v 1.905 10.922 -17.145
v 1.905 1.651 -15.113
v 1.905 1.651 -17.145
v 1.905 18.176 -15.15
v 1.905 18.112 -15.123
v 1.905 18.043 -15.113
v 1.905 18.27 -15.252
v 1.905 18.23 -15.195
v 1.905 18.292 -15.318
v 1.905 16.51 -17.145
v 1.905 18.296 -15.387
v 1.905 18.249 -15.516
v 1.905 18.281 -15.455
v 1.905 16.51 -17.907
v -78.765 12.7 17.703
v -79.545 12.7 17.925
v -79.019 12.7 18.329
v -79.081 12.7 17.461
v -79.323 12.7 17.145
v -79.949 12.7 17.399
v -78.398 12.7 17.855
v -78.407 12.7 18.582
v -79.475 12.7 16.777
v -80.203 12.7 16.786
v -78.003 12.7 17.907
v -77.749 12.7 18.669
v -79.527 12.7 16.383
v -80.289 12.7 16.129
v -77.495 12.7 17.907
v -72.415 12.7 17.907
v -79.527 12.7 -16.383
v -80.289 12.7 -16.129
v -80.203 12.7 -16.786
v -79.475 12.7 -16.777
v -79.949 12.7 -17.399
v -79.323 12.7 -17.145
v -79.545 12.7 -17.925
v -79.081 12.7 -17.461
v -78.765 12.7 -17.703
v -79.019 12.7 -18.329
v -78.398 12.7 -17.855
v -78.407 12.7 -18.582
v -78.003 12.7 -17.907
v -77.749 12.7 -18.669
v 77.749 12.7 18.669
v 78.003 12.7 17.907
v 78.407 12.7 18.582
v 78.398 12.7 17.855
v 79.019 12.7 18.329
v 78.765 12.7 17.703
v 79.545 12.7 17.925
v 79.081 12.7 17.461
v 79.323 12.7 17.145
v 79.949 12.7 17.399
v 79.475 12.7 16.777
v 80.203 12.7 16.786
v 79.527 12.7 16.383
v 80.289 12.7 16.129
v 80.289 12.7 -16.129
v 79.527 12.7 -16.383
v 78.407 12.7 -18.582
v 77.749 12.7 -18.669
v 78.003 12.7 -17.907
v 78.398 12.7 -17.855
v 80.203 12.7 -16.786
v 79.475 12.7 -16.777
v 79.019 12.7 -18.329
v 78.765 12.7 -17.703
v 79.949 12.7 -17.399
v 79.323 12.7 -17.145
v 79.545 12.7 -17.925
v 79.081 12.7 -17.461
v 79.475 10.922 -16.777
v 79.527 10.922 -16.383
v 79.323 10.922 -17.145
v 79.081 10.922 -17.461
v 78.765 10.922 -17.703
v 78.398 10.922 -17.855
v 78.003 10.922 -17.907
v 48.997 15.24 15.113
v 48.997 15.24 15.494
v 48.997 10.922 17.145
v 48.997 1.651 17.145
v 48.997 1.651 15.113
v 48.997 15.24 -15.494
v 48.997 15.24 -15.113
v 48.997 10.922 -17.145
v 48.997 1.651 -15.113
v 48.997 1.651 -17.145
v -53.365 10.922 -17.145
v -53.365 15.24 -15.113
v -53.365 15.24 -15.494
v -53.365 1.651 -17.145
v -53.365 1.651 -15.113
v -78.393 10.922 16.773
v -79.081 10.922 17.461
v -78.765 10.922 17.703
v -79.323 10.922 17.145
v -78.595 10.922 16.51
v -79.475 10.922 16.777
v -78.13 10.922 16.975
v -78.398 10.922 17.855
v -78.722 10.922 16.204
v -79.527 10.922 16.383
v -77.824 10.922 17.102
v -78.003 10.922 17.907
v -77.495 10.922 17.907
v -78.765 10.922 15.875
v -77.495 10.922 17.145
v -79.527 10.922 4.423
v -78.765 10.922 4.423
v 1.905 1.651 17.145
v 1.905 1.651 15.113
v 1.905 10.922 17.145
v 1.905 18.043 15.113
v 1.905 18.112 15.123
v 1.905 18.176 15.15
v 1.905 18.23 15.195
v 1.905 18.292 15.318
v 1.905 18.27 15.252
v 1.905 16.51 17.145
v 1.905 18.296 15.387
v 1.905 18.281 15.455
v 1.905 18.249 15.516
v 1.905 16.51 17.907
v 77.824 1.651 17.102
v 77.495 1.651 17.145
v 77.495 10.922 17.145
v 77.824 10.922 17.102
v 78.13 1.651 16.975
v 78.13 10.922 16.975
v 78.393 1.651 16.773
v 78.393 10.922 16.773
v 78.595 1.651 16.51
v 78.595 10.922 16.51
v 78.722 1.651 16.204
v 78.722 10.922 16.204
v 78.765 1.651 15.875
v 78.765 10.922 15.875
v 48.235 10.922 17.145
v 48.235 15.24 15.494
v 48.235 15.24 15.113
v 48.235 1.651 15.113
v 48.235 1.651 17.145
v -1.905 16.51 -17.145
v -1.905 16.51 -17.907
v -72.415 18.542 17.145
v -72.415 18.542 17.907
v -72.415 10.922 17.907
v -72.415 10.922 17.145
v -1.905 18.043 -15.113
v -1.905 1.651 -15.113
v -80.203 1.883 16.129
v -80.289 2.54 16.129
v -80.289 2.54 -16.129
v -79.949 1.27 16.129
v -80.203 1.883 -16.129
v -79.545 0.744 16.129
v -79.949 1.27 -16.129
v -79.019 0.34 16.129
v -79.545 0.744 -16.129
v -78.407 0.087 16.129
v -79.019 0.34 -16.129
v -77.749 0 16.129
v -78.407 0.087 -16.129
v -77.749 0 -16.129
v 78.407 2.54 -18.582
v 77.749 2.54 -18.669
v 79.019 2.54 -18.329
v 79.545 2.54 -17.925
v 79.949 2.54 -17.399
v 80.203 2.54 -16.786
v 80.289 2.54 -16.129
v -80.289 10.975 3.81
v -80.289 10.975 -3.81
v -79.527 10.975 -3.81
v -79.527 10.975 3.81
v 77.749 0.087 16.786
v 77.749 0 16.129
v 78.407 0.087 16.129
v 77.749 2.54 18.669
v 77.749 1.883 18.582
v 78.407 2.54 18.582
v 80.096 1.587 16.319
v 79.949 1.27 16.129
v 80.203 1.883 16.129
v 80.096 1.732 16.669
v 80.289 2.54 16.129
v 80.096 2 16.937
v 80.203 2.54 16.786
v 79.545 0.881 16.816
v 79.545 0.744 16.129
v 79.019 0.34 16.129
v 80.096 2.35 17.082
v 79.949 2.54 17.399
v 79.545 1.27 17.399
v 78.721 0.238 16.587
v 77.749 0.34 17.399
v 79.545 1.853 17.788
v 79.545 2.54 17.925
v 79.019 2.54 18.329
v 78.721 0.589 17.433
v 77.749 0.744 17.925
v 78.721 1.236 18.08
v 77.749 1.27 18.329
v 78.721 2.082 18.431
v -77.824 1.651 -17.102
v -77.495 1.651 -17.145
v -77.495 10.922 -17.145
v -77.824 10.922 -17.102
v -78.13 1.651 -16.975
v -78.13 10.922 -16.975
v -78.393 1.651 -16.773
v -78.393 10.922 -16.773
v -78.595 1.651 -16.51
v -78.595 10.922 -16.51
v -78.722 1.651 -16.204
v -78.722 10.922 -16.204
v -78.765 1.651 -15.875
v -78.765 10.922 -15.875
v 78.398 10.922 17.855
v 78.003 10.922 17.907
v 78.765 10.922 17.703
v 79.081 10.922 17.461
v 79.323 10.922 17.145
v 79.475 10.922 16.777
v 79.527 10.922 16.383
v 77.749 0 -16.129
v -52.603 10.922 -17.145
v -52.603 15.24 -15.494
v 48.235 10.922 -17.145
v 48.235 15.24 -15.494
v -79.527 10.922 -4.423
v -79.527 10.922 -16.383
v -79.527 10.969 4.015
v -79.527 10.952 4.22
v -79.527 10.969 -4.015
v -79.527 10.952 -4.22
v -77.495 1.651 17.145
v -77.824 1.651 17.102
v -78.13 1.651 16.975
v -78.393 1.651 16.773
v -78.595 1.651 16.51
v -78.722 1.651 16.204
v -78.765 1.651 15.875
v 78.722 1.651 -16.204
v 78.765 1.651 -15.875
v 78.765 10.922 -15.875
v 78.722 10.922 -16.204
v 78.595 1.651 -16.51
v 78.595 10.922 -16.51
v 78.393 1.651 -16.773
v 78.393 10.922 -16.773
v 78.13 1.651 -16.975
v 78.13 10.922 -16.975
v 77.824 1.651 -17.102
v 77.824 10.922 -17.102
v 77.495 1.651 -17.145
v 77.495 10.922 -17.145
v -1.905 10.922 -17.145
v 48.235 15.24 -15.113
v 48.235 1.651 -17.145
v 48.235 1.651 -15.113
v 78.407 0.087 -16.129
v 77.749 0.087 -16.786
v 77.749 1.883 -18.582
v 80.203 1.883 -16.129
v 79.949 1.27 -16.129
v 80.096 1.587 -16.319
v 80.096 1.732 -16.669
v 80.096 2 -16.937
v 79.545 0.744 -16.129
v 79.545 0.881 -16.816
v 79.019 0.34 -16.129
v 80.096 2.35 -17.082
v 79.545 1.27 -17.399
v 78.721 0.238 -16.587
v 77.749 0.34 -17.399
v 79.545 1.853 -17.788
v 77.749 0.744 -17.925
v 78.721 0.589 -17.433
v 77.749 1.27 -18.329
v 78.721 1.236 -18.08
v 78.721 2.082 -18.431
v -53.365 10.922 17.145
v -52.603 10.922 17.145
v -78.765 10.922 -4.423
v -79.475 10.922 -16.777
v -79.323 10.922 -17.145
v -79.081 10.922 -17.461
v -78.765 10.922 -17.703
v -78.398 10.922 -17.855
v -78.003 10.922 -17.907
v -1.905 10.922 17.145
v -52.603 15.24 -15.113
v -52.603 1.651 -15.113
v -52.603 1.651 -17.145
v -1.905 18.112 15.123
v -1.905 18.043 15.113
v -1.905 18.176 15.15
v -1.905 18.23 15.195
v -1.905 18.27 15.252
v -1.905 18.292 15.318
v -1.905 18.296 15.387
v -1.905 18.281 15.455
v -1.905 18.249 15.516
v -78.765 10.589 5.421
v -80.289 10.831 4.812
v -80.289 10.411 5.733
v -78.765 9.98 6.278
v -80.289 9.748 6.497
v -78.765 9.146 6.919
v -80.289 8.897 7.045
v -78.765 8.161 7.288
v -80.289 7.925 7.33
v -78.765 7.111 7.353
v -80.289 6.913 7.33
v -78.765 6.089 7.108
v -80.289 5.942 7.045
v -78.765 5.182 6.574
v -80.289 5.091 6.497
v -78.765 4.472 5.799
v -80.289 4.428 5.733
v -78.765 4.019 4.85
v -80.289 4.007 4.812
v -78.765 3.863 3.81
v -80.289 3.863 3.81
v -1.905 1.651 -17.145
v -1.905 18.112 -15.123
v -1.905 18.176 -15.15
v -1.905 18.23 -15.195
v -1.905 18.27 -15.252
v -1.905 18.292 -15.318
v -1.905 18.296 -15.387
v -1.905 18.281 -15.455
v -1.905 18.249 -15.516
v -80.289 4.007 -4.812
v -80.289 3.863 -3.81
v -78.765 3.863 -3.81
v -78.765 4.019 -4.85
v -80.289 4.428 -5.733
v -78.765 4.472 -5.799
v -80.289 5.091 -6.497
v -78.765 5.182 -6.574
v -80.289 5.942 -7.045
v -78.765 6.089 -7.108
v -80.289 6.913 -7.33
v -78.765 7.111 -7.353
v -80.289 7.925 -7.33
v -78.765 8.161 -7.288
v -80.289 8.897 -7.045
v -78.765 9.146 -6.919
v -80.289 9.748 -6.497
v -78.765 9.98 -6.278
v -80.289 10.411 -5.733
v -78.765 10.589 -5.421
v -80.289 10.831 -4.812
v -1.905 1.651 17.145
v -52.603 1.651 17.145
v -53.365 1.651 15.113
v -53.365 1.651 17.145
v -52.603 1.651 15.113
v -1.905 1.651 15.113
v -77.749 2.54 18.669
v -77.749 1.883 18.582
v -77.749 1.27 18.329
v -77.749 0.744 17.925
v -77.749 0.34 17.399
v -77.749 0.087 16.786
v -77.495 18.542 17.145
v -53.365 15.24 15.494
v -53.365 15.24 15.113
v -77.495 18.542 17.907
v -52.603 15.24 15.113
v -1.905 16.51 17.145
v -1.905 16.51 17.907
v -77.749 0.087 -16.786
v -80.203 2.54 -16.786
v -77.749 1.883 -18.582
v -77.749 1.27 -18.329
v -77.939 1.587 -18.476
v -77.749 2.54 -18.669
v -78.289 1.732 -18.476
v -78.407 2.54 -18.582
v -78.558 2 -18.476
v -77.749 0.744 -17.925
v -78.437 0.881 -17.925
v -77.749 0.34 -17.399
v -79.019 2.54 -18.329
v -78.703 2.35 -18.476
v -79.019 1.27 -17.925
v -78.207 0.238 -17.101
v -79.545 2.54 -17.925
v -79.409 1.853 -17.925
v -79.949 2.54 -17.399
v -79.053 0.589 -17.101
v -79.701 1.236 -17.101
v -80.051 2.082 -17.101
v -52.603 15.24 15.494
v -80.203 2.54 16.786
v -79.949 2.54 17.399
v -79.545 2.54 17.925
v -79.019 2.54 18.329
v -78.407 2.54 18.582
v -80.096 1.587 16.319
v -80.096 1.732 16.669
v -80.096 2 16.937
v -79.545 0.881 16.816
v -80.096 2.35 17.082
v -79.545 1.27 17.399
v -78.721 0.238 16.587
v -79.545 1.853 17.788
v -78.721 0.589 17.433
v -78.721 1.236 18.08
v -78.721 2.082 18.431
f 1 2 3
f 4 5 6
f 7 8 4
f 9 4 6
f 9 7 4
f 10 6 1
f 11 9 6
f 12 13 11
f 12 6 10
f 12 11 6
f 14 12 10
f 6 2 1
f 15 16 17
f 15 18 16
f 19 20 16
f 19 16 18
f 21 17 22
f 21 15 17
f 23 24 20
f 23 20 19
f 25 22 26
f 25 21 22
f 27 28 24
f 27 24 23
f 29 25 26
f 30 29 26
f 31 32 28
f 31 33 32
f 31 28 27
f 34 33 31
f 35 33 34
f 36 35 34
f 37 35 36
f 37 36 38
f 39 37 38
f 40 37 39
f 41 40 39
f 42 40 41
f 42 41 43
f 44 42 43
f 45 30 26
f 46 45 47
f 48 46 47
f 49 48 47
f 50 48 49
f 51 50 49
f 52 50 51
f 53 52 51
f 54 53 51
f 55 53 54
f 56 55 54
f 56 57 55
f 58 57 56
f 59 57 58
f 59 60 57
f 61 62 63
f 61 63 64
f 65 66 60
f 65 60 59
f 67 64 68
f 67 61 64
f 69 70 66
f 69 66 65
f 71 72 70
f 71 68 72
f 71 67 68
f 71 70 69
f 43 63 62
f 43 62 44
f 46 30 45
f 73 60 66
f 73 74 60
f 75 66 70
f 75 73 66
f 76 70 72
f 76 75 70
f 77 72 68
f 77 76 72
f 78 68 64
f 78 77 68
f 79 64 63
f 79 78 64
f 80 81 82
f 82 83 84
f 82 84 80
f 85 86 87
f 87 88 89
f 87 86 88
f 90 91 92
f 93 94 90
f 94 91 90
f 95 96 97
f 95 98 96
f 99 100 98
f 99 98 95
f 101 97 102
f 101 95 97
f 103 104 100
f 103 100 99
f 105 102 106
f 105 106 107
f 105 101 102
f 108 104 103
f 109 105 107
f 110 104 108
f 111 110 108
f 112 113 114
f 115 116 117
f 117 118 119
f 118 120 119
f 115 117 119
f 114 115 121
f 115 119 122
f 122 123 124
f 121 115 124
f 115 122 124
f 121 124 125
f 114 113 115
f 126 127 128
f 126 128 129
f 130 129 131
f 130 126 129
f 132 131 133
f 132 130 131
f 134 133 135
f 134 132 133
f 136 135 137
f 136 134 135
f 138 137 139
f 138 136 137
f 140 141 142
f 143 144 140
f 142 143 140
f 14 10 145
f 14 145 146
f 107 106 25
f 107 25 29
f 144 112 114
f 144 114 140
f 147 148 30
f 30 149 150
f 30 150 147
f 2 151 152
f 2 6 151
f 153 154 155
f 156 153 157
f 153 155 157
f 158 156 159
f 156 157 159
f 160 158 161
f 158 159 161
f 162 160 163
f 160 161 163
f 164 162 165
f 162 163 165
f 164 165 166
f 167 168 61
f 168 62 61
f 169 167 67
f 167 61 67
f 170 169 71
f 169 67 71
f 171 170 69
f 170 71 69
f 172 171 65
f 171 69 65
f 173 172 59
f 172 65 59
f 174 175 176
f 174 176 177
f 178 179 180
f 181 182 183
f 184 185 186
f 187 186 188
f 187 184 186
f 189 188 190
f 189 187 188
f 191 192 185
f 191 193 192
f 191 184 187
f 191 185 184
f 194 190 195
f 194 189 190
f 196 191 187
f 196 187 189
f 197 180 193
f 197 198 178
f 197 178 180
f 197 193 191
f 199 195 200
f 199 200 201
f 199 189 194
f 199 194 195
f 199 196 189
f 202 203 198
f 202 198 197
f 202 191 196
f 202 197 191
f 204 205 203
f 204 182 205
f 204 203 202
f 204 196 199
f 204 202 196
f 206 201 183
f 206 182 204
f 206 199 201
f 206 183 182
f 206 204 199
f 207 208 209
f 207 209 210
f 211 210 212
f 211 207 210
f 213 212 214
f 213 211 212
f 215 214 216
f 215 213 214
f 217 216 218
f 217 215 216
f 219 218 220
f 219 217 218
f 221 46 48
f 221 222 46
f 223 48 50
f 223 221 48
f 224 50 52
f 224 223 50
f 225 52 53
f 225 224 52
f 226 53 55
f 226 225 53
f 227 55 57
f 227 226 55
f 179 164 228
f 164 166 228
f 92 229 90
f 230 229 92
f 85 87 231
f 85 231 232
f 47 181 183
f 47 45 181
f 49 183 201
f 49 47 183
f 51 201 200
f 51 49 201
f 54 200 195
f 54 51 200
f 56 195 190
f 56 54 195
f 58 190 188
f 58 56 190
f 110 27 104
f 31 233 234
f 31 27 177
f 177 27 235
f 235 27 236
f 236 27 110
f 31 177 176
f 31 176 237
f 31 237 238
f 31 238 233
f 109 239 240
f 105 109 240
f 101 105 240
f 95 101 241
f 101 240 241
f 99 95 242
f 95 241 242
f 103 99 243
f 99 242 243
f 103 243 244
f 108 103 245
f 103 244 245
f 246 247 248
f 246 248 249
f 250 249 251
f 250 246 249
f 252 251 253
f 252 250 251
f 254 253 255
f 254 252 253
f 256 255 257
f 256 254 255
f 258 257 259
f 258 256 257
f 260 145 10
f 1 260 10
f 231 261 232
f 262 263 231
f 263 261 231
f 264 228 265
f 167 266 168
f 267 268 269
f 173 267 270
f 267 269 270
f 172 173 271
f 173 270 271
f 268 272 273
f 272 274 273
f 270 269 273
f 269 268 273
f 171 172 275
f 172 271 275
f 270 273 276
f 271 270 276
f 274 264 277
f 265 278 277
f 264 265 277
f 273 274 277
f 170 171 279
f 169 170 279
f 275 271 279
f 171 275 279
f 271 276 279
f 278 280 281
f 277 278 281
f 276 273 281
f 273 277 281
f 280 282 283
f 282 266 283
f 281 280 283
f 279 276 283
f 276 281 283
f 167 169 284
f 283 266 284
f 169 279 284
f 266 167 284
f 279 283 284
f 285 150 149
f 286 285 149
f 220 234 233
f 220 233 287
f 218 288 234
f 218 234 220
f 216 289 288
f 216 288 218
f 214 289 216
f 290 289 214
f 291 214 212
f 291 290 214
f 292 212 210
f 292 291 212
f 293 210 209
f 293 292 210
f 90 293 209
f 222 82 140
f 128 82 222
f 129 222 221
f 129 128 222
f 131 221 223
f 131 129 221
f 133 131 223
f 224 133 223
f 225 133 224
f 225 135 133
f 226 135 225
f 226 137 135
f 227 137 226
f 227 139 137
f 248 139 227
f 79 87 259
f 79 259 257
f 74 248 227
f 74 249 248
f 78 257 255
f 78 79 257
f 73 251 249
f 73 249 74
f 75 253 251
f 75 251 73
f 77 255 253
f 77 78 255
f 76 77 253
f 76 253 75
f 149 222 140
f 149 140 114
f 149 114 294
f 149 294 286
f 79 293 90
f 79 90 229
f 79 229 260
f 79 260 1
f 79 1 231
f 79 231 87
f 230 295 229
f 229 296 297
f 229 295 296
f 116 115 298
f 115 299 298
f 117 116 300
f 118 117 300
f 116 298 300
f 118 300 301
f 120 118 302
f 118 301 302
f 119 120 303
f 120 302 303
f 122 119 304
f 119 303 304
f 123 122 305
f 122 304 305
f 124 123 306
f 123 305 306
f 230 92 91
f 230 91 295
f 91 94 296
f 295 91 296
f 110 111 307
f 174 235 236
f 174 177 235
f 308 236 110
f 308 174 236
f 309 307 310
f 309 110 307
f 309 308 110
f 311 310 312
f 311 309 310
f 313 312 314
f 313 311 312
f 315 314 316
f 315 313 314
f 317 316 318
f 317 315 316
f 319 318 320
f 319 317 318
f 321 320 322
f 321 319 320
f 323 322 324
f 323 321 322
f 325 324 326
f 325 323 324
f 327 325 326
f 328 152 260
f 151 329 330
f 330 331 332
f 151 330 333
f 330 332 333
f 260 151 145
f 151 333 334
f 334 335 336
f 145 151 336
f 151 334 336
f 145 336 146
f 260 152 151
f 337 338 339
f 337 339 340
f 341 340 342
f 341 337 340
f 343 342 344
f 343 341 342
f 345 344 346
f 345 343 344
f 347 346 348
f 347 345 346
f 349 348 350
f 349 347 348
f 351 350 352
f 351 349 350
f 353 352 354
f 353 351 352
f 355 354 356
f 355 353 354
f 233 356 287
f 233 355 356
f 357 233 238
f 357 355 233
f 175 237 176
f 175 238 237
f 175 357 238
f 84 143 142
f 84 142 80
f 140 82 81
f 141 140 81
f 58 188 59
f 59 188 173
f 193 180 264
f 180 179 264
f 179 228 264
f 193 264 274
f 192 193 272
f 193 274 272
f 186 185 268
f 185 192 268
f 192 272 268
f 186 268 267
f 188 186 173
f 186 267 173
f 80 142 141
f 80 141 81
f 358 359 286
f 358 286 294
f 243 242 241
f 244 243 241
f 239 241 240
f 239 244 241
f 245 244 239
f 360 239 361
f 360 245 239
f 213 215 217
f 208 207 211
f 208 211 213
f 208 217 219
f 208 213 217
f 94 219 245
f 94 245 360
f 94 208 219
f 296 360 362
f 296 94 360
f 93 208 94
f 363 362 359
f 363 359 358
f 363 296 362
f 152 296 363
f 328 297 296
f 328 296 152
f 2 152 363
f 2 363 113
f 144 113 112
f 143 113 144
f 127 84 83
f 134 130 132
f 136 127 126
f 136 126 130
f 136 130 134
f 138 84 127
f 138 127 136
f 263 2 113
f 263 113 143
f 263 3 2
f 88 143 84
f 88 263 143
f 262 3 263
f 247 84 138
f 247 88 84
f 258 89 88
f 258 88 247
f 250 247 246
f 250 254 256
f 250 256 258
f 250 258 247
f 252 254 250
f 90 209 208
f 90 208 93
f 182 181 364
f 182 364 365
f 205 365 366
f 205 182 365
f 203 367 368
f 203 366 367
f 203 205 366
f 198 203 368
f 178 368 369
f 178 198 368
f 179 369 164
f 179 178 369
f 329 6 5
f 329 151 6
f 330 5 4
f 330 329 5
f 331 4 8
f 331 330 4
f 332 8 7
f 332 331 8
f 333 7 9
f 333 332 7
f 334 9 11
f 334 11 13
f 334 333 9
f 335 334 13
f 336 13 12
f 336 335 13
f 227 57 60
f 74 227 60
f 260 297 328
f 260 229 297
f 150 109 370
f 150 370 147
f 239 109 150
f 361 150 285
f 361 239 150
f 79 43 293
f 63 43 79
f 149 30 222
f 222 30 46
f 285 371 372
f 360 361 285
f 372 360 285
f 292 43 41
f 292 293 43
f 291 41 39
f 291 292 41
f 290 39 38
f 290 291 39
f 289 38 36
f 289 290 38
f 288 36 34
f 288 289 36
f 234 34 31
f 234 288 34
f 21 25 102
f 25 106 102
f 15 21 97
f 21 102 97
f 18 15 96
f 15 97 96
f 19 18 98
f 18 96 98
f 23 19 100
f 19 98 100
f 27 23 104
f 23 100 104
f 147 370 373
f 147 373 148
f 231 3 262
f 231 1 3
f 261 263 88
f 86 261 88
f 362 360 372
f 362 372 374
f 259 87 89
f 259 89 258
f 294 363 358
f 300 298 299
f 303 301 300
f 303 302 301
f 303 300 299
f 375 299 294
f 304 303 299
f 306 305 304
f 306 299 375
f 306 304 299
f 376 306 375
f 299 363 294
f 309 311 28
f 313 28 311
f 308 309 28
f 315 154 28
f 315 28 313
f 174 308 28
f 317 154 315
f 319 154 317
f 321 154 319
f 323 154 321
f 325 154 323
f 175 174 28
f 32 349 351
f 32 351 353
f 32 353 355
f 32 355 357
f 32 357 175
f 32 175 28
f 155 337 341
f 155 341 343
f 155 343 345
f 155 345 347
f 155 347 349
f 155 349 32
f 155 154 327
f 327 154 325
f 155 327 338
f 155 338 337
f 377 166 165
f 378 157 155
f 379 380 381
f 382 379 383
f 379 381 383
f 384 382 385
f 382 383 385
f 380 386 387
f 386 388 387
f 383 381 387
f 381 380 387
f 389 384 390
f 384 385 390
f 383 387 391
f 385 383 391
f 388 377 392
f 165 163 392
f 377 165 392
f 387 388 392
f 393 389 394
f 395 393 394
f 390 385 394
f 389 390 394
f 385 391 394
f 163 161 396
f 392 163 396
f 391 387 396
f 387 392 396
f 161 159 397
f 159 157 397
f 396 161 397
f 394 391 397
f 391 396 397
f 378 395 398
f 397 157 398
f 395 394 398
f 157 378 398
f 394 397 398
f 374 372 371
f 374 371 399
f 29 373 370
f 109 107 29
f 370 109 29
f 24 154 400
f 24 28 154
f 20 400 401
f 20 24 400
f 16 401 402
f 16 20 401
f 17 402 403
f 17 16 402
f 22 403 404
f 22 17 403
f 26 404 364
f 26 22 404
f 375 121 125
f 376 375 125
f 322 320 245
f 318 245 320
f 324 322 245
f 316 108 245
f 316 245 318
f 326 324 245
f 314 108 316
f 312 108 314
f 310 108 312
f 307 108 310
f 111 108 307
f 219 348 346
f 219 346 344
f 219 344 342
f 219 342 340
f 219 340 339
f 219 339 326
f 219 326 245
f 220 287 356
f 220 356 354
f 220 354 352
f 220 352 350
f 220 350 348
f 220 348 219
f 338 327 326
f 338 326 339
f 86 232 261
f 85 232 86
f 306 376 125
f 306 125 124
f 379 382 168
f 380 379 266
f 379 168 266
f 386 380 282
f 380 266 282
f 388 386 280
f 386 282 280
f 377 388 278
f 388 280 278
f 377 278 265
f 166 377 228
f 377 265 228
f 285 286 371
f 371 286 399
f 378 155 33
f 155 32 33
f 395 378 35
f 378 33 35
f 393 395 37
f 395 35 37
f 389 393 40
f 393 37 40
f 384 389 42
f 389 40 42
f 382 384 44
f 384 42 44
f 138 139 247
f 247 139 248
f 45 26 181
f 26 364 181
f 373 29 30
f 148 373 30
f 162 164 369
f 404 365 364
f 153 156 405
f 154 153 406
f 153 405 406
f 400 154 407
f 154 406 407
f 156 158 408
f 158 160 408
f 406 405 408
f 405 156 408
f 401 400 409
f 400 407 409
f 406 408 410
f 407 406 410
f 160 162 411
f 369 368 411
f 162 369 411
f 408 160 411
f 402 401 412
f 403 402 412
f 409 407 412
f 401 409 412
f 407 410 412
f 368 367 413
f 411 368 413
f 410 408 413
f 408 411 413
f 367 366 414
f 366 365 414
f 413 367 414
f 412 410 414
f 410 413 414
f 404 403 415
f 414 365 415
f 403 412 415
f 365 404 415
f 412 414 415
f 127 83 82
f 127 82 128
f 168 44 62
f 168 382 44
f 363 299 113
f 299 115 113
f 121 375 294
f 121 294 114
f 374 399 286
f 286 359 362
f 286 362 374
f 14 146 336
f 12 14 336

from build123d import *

# Parameters (mm, degrees)
SKETCH1_W            = 160.5788
SKETCH1_H            = 37.338
BOSS_EXTRUDE1_DEPTH  = 12.7
SKETCH2_W            = 157.5308
SKETCH2_H            = 34.29
CUT_EXTRUDE3_DEPTH   = 11.049
FILLET1_R            = 2.54
FILLET2_R            = 1.27
CUT_EXTRUDE4_REACH   = 164.158
SKETCH4_W            = 159.0548
SKETCH4_H            = 35.814
CUT_EXTRUDE5_DEPTH   = 1.778
FILLET3_R            = 1.524
SKETCH5_W            = 5.08
SKETCH5_H            = 0.762
BOSS_EXTRUDE2_DEPTH  = 7.62
SKETCH6_W            = 0.762
SKETCH6_H            = 2.032
BOSS_EXTRUDE3_DEPTH  = 13.589
LPATTERN1_COUNT      = 2
LPATTERN1_PITCH      = 101.6
LPATTERN1_COUNT_DIR2 = 2
LPATTERN1_PITCH_DIR2 = 32.258
CUT_EXTRUDE6_REACH   = 133.936
SKETCH8_W            = 3.81
SKETCH8_H            = 2.032
BOSS_EXTRUDE4_DEPTH  = 14.859
BOSS_EXTRUDE9_DEPTH  = 3.81
FILLET4_R            = 0.254
FILLET4_OF_MIRROR2_R = 0.254


with BuildPart() as part:
    # Sketch1 → Boss-Extrude1 (new body)
    with BuildSketch(Plane(origin=(0, 0, 0), x_dir=(1, 0, 0), z_dir=(0, 1, 0))):
        Rectangle(SKETCH1_W, SKETCH1_H)
    extrude(amount=BOSS_EXTRUDE1_DEPTH)

    # Sketch2 → Cut-Extrude3 (cut)
    with BuildSketch(Plane(origin=(0, 12.7, 0), x_dir=(1, 0, 0), z_dir=(0, 1, 0))):
        Rectangle(SKETCH2_W, SKETCH2_H)
    extrude(amount=-CUT_EXTRUDE3_DEPTH, mode=Mode.SUBTRACT)

    # Fillet1
    fillet1_edges = [part.edges().sort_by_distance(p)[0] for p in [
        (0, 0, 18.669),
        (-80.2894, 0, 0),
        (0, 0, -18.669),
        (80.2894, 0, 0),
        (80.2894, 6.35, 18.669),
        (-80.2894, 6.35, 18.669),
        (-80.2894, 6.35, -18.669),
        (80.2894, 6.35, -18.669),
    ]]
    fillet(fillet1_edges, radius=FILLET1_R)

    # Fillet2
    fillet2_edges = [part.edges().sort_by_distance(p)[0] for p in [
        (-78.7654, 7.1755, -17.145),
        (-78.7654, 7.1755, 17.145),
        (78.7654, 7.1755, 17.145),
        (78.7654, 7.1755, -17.145),
    ]]
    fillet(fillet2_edges, radius=FILLET2_R)

    # Sketch3 → Cut-Extrude4 (cut, up to next)
    with BuildSketch(Plane.ZY.offset(80.2894), mode=Mode.PRIVATE) as cut_extrude4_sk1:
        with BuildLine():
            Line((3.81, 3.8633146), (-3.81, 3.8633146))
            ThreePointArc((-3.81, 3.8633146), (-7.366, 7.4193146), (-3.81, 10.9753146))
            Line((-3.81, 10.9753146), (3.81, 10.9753146))
            ThreePointArc((3.81, 10.9753146), (7.366, 7.4193146), (3.81, 3.8633146))
        make_face()
    cut_extrude4_tool1 = extrude(cut_extrude4_sk1.sketch, amount=-CUT_EXTRUDE4_REACH, mode=Mode.PRIVATE) & part.part
    add(cut_extrude4_tool1.solids().sort_by_distance((-80.2894, 7.419315, 0))[0], mode=Mode.SUBTRACT)

    # Sketch4 → Cut-Extrude5 (cut)
    with BuildSketch(Plane(origin=(0, 12.7, 0), x_dir=(1, 0, 0), z_dir=(0, 1, 0))):
        Rectangle(SKETCH4_W, SKETCH4_H)
    extrude(amount=-CUT_EXTRUDE5_DEPTH, mode=Mode.SUBTRACT)

    # Fillet3
    fillet3_edges = [part.edges().sort_by_distance(p)[0] for p in [
        (-79.5274, 11.811, 17.907),
        (-79.5274, 11.811, -17.907),
        (79.5274, 11.811, -17.907),
        (79.5274, 11.811, 17.907),
    ]]
    fillet(fillet3_edges, radius=FILLET3_R)

    # Sketch5 → Boss-Extrude2 (add)
    with BuildSketch(Plane(origin=(0, 10.922, 0), x_dir=(1, 0, 0), z_dir=(0, 1, 0))):
        with Locations((-74.9554, -17.526)):
            Rectangle(SKETCH5_W, SKETCH5_H)
    extrude(amount=BOSS_EXTRUDE2_DEPTH)

    # Sketch6 → Boss-Extrude3 (add)
    with BuildSketch(Plane(origin=(0, 1.651, 0), x_dir=(1, 0, 0), z_dir=(0, 1, 0))):
        with Locations((-52.9844, 16.129)):
            Rectangle(SKETCH6_W, SKETCH6_H)
    boss_extrude3 = extrude(amount=BOSS_EXTRUDE3_DEPTH)

    # LPattern1: Boss-Extrude3 2 × 2
    with Locations(*[(i * LPATTERN1_PITCH, 0, j * LPATTERN1_PITCH_DIR2) for i in range(LPATTERN1_COUNT) for j in range(LPATTERN1_COUNT_DIR2) if (i, j) != (0, 0)]):
        add(boss_extrude3)

    # Cut-Extrude6: up to this face of the body (flat: up to its plane)
    cut_extrude6_end = Plane(part.part.faces().sort_by_distance((-53.3654, 8.4455, -16.129))[0])
    # Sketch7 → Cut-Extrude6 (cut, up to the picked face)
    with BuildSketch(Plane(origin=(48.9966, 0, 0), x_dir=(0, 0, -1), z_dir=(1, 0, 0)), mode=Mode.PRIVATE) as cut_extrude6_sk1:
        Polygon((17.145, 10.922), (15.494, 15.24), (17.145, 15.24), align=None)
    cut_extrude6_tool1 = split(extrude(cut_extrude6_sk1.sketch, amount=-CUT_EXTRUDE6_REACH, mode=Mode.PRIVATE), bisect_by=cut_extrude6_end, keep=Keep.BOTH, mode=Mode.PRIVATE)
    cut_extrude6 = cut_extrude6_tool1.solids().sort_by(Axis((48.9966, 13.800667, -16.594667), (-1, 0, 0)))[0]
    add(cut_extrude6, mode=Mode.SUBTRACT)

    # Mirror1: Cut-Extrude6 across plane
    add(cut_extrude6.mirror(Plane.XY), mode=Mode.SUBTRACT)

    # Sketch8 → Boss-Extrude4 (add)
    with BuildSketch(Plane(origin=(0, 1.651, 0), x_dir=(1, 0, 0), z_dir=(0, 1, 0))):
        with Locations((0, -16.129)):
            Rectangle(SKETCH8_W, SKETCH8_H)
        with Locations((0, 16.129)):
            Rectangle(SKETCH8_W, SKETCH8_H)
    extrude(amount=BOSS_EXTRUDE4_DEPTH)

    # Sketch9 → Boss-Extrude9 (add)
    with BuildSketch(Plane(origin=(1.905, 0, 0), x_dir=(0, 0, -1), z_dir=(1, 0, 0))):
        Polygon((-15.113, 16.51), (-17.907, 16.51), (-15.113, 18.542), align=None)
    boss_extrude9 = extrude(amount=-BOSS_EXTRUDE9_DEPTH)

    # Fillet4
    fillet4_edges = [part.edges().sort_by_distance(p)[0] for p in [
        (0, 18.542, 15.113),
    ]]
    fillet(fillet4_edges, radius=FILLET4_R)

    # Mirror2: Boss-Extrude9 across plane
    add(boss_extrude9.mirror(Plane.XY))

    # Fillet4 of Mirror2
    fillet4_of_mirror2_edges = [part.edges().sort_by_distance(p)[0] for p in [
        (0, 18.542, -15.113),
    ]]
    fillet(fillet4_of_mirror2_edges, radius=FILLET4_OF_MIRROR2_R)


solid = part.part
